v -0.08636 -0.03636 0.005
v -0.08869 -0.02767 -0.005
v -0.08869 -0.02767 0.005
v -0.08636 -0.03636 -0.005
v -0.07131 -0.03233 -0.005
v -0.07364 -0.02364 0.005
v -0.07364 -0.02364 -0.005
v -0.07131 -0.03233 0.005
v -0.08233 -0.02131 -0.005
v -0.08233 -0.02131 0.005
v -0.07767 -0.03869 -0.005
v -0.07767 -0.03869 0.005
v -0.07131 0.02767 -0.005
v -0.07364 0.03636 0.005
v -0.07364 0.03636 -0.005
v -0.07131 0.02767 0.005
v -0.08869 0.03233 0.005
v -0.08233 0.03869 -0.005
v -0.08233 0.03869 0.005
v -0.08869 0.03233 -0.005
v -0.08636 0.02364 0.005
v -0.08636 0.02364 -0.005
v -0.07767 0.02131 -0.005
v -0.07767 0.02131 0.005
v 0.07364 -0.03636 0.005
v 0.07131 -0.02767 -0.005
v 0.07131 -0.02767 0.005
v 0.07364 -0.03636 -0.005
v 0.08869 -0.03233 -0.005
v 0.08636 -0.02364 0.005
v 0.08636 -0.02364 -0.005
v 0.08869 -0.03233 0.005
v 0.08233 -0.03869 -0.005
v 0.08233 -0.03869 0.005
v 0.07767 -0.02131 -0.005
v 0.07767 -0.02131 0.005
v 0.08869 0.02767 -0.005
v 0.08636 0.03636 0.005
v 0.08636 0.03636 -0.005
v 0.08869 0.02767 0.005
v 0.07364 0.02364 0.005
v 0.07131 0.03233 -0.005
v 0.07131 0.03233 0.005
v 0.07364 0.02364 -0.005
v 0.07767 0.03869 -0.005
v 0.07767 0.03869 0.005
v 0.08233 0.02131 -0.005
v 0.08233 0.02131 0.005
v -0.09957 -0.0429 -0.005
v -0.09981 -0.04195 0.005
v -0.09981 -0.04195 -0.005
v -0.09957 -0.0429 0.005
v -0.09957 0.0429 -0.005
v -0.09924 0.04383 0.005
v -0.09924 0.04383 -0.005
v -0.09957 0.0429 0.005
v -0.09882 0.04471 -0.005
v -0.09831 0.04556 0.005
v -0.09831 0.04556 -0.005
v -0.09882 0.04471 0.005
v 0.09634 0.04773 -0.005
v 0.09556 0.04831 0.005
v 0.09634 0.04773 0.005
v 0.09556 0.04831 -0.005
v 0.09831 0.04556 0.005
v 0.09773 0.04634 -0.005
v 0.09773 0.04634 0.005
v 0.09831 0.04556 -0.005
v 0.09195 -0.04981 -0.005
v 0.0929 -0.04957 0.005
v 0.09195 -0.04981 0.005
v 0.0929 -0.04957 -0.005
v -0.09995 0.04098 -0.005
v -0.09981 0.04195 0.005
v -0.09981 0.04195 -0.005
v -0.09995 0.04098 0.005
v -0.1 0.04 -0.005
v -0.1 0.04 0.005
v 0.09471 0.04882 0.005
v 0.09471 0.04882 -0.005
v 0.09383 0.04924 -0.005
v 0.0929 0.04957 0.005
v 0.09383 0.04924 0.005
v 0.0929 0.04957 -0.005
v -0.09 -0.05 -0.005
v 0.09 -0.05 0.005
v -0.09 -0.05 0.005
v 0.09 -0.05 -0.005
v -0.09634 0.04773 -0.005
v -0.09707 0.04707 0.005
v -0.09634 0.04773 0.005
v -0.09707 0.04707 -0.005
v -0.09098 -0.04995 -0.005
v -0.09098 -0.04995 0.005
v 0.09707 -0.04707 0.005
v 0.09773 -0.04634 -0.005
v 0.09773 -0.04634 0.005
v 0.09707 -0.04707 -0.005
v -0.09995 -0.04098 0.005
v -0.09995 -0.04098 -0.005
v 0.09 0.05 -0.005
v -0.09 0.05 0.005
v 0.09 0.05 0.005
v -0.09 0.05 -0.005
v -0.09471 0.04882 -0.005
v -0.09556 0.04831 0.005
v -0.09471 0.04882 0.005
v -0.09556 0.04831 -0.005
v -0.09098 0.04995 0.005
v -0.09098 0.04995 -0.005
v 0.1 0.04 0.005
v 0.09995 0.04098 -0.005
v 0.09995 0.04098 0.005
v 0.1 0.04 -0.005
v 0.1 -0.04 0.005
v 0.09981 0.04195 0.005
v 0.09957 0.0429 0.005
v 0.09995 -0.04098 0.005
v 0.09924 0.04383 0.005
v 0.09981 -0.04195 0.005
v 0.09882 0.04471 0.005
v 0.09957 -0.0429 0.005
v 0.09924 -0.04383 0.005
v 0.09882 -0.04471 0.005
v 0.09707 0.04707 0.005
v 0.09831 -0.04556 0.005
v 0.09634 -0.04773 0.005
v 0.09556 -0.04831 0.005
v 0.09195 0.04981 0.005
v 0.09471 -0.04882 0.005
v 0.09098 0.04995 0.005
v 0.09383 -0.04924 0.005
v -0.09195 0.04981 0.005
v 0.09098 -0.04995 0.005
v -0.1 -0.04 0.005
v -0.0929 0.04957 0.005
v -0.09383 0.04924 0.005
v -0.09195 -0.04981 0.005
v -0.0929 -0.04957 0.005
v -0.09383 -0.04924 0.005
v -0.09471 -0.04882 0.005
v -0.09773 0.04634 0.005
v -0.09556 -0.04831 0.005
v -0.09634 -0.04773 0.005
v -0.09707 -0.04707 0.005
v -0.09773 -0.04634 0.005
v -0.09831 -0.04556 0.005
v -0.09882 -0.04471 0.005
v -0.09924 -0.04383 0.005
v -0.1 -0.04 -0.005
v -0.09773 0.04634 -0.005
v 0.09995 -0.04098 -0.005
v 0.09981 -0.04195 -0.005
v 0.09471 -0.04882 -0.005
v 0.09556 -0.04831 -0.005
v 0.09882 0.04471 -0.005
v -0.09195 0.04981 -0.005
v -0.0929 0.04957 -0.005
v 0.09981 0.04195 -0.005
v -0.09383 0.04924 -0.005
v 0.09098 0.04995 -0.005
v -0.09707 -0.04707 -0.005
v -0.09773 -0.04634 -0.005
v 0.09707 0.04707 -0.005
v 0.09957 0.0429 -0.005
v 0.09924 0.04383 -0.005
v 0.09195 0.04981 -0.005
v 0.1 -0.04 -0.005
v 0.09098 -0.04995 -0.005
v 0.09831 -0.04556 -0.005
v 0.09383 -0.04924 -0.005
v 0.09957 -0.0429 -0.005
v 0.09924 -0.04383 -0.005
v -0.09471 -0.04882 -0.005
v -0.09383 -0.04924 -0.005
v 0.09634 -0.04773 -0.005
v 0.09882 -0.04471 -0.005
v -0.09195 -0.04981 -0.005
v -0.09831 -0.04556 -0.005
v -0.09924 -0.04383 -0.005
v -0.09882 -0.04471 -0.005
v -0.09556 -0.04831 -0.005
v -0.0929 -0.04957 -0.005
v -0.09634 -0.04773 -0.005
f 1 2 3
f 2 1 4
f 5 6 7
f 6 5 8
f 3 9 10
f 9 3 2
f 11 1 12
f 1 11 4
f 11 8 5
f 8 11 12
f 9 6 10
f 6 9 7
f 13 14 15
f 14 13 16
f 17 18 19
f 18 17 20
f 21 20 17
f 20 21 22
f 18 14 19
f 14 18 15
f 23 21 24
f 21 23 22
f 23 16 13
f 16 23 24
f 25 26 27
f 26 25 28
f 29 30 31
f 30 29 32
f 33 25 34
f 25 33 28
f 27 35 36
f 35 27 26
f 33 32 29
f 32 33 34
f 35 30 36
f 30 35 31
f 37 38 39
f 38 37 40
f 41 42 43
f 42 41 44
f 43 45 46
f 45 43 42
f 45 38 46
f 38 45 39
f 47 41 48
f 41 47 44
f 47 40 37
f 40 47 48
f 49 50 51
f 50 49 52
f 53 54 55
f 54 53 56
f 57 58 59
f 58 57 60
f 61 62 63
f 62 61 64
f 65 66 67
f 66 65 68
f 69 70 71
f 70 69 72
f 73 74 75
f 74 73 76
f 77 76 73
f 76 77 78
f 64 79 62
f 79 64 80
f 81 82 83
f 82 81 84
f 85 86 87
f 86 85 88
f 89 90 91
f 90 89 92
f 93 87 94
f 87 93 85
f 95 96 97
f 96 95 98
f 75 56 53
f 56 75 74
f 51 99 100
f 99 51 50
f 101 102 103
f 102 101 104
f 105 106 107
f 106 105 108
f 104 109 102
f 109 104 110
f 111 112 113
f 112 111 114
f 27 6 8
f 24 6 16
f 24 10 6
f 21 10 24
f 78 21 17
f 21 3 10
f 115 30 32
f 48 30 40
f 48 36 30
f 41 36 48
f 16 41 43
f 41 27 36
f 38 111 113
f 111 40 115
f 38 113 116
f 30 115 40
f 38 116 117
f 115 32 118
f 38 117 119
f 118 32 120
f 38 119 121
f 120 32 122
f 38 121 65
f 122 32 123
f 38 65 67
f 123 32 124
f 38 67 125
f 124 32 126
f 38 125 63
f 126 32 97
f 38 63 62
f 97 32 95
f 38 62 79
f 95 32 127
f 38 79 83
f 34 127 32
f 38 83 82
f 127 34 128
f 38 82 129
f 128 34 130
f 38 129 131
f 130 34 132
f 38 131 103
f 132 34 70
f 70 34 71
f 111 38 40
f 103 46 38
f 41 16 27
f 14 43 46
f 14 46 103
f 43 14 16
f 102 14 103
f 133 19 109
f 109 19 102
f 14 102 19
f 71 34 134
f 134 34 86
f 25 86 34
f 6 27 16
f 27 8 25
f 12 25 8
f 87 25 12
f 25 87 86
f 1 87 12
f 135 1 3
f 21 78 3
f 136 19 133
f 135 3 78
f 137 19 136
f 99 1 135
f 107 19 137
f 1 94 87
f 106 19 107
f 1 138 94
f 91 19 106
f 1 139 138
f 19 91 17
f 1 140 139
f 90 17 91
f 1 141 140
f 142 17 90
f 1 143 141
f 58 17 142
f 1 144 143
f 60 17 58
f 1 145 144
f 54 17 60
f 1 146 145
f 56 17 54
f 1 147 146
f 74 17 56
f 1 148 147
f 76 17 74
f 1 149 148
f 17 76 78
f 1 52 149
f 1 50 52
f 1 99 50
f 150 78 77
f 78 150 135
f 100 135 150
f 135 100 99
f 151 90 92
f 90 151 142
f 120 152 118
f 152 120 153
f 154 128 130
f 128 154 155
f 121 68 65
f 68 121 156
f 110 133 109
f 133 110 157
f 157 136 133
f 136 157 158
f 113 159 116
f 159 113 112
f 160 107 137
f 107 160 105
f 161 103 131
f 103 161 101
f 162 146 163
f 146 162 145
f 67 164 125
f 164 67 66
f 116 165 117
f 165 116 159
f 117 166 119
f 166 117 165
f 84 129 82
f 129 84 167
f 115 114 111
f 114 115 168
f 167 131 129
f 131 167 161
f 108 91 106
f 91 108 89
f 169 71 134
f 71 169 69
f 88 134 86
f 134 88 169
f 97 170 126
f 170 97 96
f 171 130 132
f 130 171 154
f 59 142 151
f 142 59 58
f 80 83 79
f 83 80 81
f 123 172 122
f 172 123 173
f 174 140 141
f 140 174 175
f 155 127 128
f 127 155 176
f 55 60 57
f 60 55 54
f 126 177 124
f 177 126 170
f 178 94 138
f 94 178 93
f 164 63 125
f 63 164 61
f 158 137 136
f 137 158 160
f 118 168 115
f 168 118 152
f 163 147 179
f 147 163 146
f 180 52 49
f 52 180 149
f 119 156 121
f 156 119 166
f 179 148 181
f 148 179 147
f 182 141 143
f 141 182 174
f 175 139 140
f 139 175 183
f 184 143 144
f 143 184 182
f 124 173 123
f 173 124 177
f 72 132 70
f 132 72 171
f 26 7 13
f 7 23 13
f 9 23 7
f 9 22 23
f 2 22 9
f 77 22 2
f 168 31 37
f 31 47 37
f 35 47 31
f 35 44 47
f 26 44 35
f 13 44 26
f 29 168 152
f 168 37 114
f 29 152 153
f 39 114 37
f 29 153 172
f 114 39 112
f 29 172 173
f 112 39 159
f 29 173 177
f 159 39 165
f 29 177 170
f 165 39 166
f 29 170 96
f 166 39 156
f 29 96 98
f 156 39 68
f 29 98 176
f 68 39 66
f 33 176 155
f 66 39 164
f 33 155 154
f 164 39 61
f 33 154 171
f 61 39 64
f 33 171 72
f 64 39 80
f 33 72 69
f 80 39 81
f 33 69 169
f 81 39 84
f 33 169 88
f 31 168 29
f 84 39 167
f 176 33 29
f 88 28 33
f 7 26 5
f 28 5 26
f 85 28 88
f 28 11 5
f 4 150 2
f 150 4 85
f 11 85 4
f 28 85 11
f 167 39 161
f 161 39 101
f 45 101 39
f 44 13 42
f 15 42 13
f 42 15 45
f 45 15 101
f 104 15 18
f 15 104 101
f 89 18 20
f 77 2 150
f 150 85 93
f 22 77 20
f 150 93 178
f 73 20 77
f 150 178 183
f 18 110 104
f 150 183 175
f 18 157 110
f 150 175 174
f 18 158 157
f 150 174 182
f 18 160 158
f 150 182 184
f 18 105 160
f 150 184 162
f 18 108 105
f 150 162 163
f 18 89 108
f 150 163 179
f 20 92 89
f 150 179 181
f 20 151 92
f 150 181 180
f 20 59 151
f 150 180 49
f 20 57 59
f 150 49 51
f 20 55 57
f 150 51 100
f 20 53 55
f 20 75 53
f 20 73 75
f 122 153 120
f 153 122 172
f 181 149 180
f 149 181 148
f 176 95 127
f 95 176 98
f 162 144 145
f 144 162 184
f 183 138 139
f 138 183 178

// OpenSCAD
$fn=64;

plate_x = 0.2;
plate_y = 0.1;
thickness = 0.01;

corner_r = 0.01;

cutout_size = 0.018;
cutout_offset_x = 0.02;
cutout_offset_y = 0.02;
cutout_rot = 45;

module rounded_rect_2d(w, h, r){
    r2 = min(r, min(w,h)/2);
    hull(){
        translate([ w/2 - r2,  h/2 - r2]) circle(r=r2);
        translate([-w/2 + r2,  h/2 - r2]) circle(r=r2);
        translate([-w/2 + r2, -h/2 + r2]) circle(r=r2);
        translate([ w/2 - r2, -h/2 + r2]) circle(r=r2);
    }
}

module corner_cutout_2d(s){
    rotate(cutout_rot)
        circle(r=s/2, $fn=6);
}

module plate(){
    linear_extrude(height=thickness, center=true)
        rounded_rect_2d(plate_x, plate_y, corner_r);
}

module cutouts(){
    for (sx = [-1, 1], sy = [-1, 1]){
        translate([sx*(plate_x/2 - cutout_offset_x), sy*(plate_y/2 - cutout_offset_y), 0])
            linear_extrude(height=thickness*3, center=true)
                corner_cutout_2d(cutout_size);
    }
}

difference(){
    plate();
    cutouts();
}
